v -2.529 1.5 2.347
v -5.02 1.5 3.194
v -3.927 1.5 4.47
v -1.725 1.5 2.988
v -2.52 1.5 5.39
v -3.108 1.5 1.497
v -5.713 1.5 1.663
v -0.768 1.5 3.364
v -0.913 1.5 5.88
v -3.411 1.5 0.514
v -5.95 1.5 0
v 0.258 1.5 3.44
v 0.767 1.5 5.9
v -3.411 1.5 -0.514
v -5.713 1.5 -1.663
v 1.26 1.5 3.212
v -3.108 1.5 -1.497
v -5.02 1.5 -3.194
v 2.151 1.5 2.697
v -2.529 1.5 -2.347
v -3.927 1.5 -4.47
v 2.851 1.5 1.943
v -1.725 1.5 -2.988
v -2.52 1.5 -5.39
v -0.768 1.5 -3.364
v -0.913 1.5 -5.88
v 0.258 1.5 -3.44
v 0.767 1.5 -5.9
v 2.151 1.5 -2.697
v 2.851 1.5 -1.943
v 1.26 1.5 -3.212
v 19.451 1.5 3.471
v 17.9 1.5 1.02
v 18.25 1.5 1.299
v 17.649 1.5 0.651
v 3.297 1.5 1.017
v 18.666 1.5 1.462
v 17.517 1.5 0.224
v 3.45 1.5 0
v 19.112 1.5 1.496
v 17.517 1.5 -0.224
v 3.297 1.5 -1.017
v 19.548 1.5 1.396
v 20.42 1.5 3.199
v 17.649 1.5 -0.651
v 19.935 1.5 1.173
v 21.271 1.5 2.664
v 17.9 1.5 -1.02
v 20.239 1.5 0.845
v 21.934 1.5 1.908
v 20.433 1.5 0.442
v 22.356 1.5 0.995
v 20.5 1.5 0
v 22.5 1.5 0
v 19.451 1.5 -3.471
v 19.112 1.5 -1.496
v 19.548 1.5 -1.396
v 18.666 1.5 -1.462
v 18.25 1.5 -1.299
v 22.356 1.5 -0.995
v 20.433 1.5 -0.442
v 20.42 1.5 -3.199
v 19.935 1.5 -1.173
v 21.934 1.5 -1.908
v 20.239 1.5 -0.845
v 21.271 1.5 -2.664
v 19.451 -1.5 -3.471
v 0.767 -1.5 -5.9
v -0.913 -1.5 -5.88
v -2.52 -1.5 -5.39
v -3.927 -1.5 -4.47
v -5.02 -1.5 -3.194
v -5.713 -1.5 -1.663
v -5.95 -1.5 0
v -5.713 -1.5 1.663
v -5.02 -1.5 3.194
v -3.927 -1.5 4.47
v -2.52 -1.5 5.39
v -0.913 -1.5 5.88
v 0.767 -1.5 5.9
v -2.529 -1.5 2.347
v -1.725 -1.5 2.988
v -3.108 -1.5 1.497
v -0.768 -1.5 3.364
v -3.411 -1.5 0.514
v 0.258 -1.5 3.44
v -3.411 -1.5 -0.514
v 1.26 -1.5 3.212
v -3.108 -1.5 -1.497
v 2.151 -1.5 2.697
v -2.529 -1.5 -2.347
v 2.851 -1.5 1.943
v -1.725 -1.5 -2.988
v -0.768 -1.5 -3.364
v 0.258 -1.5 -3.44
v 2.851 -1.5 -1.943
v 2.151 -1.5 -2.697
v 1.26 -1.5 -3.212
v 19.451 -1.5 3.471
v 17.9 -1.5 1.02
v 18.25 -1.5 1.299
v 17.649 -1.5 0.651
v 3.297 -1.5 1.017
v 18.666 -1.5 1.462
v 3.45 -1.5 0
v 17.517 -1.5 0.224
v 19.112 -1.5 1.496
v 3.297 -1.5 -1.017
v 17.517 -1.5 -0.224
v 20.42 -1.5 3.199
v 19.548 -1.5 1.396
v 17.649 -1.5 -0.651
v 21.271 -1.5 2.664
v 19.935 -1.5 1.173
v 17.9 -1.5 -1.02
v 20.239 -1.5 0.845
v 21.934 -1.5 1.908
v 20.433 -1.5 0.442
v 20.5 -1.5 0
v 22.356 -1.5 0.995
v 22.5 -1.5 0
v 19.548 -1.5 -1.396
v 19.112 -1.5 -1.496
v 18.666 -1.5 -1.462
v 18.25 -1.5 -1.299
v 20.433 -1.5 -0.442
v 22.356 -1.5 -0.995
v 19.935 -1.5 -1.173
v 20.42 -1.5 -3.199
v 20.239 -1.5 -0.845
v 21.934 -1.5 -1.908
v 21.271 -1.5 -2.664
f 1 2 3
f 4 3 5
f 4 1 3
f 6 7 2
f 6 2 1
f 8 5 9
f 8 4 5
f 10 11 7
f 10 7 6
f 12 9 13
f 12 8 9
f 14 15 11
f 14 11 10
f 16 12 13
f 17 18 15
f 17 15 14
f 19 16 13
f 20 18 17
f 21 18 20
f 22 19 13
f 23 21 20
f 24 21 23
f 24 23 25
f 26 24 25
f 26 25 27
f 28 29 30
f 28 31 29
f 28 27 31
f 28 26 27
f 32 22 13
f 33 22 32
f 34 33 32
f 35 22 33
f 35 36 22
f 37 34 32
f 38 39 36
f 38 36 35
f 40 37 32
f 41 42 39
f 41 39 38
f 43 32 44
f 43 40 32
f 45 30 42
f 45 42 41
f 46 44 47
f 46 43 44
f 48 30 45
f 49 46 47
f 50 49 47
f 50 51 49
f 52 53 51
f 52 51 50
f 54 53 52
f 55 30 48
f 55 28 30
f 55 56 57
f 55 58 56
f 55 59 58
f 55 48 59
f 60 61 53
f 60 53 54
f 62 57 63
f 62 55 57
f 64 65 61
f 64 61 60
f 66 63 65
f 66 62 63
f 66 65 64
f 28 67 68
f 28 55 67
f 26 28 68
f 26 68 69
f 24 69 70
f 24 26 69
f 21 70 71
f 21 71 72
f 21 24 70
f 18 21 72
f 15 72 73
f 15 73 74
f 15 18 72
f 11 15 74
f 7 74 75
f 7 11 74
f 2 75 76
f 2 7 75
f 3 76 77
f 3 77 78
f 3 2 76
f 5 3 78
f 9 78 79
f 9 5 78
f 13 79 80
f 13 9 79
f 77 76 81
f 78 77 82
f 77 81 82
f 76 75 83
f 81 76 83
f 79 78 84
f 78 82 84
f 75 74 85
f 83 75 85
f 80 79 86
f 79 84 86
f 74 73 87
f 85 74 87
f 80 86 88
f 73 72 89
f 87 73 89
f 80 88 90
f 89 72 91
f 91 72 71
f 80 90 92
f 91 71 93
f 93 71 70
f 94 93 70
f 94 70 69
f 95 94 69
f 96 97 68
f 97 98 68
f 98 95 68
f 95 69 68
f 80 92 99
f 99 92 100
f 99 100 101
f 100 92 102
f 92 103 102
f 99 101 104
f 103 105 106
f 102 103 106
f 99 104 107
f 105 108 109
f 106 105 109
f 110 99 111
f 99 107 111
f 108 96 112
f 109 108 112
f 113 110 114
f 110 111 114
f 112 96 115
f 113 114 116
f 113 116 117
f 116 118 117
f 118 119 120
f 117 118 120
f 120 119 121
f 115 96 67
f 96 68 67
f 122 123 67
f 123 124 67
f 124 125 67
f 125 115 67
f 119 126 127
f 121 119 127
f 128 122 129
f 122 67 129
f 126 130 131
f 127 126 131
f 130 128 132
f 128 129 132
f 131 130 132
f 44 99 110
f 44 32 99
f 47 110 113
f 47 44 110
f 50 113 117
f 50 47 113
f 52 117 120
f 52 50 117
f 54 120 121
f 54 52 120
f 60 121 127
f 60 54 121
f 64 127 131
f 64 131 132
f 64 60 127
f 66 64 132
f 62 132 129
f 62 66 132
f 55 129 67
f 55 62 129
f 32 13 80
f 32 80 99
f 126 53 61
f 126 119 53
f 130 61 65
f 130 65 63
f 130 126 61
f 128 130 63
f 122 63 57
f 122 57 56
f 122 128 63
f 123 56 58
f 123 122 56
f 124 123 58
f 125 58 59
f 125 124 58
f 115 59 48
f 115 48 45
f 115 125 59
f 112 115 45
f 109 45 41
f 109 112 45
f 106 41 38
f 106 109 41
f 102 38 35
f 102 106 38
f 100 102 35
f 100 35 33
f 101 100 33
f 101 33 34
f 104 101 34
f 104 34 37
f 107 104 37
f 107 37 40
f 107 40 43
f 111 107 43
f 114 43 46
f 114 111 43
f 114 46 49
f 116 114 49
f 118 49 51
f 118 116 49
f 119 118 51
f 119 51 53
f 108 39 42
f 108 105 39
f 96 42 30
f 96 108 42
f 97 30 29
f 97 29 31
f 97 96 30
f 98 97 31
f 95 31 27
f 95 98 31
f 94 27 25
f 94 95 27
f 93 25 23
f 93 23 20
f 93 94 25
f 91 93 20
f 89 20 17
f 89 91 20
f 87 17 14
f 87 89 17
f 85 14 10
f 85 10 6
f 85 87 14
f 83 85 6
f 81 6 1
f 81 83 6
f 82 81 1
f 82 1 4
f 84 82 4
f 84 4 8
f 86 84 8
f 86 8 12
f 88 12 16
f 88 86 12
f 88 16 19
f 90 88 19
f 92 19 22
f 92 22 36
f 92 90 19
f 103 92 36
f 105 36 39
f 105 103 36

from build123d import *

# Parameters (mm, degrees)
SKETCH1_R           = 1.5
SKETCH1_R_2         = 3.45
BOSS_EXTRUDE1_DEPTH = 1.5


with BuildPart() as part:
    # Sketch1 → Boss-Extrude1 (new body, symmetric)
    with BuildSketch(Plane(origin=(0, 0, 0), x_dir=(1, 0, 0), z_dir=(0, 1, 0))):
        with BuildLine():
            Line((19.451315789, 3.470780036), (0.767236842, 5.900326061))
            ThreePointArc((0.767236842, 5.900326061), (-5.95, 0), (0.767236842, -5.900326061))
            Line((0.767236842, -5.900326061), (19.451315789, -3.470780036))
            ThreePointArc((19.451315789, -3.470780036), (22.5, 0), (19.451315789, 3.470780036))
        make_face()
        with Locations((19, 0)):
            Circle(SKETCH1_R, mode=Mode.SUBTRACT)
        Circle(SKETCH1_R_2, mode=Mode.SUBTRACT)
    extrude(amount=BOSS_EXTRUDE1_DEPTH, both=True)


solid = part.part
